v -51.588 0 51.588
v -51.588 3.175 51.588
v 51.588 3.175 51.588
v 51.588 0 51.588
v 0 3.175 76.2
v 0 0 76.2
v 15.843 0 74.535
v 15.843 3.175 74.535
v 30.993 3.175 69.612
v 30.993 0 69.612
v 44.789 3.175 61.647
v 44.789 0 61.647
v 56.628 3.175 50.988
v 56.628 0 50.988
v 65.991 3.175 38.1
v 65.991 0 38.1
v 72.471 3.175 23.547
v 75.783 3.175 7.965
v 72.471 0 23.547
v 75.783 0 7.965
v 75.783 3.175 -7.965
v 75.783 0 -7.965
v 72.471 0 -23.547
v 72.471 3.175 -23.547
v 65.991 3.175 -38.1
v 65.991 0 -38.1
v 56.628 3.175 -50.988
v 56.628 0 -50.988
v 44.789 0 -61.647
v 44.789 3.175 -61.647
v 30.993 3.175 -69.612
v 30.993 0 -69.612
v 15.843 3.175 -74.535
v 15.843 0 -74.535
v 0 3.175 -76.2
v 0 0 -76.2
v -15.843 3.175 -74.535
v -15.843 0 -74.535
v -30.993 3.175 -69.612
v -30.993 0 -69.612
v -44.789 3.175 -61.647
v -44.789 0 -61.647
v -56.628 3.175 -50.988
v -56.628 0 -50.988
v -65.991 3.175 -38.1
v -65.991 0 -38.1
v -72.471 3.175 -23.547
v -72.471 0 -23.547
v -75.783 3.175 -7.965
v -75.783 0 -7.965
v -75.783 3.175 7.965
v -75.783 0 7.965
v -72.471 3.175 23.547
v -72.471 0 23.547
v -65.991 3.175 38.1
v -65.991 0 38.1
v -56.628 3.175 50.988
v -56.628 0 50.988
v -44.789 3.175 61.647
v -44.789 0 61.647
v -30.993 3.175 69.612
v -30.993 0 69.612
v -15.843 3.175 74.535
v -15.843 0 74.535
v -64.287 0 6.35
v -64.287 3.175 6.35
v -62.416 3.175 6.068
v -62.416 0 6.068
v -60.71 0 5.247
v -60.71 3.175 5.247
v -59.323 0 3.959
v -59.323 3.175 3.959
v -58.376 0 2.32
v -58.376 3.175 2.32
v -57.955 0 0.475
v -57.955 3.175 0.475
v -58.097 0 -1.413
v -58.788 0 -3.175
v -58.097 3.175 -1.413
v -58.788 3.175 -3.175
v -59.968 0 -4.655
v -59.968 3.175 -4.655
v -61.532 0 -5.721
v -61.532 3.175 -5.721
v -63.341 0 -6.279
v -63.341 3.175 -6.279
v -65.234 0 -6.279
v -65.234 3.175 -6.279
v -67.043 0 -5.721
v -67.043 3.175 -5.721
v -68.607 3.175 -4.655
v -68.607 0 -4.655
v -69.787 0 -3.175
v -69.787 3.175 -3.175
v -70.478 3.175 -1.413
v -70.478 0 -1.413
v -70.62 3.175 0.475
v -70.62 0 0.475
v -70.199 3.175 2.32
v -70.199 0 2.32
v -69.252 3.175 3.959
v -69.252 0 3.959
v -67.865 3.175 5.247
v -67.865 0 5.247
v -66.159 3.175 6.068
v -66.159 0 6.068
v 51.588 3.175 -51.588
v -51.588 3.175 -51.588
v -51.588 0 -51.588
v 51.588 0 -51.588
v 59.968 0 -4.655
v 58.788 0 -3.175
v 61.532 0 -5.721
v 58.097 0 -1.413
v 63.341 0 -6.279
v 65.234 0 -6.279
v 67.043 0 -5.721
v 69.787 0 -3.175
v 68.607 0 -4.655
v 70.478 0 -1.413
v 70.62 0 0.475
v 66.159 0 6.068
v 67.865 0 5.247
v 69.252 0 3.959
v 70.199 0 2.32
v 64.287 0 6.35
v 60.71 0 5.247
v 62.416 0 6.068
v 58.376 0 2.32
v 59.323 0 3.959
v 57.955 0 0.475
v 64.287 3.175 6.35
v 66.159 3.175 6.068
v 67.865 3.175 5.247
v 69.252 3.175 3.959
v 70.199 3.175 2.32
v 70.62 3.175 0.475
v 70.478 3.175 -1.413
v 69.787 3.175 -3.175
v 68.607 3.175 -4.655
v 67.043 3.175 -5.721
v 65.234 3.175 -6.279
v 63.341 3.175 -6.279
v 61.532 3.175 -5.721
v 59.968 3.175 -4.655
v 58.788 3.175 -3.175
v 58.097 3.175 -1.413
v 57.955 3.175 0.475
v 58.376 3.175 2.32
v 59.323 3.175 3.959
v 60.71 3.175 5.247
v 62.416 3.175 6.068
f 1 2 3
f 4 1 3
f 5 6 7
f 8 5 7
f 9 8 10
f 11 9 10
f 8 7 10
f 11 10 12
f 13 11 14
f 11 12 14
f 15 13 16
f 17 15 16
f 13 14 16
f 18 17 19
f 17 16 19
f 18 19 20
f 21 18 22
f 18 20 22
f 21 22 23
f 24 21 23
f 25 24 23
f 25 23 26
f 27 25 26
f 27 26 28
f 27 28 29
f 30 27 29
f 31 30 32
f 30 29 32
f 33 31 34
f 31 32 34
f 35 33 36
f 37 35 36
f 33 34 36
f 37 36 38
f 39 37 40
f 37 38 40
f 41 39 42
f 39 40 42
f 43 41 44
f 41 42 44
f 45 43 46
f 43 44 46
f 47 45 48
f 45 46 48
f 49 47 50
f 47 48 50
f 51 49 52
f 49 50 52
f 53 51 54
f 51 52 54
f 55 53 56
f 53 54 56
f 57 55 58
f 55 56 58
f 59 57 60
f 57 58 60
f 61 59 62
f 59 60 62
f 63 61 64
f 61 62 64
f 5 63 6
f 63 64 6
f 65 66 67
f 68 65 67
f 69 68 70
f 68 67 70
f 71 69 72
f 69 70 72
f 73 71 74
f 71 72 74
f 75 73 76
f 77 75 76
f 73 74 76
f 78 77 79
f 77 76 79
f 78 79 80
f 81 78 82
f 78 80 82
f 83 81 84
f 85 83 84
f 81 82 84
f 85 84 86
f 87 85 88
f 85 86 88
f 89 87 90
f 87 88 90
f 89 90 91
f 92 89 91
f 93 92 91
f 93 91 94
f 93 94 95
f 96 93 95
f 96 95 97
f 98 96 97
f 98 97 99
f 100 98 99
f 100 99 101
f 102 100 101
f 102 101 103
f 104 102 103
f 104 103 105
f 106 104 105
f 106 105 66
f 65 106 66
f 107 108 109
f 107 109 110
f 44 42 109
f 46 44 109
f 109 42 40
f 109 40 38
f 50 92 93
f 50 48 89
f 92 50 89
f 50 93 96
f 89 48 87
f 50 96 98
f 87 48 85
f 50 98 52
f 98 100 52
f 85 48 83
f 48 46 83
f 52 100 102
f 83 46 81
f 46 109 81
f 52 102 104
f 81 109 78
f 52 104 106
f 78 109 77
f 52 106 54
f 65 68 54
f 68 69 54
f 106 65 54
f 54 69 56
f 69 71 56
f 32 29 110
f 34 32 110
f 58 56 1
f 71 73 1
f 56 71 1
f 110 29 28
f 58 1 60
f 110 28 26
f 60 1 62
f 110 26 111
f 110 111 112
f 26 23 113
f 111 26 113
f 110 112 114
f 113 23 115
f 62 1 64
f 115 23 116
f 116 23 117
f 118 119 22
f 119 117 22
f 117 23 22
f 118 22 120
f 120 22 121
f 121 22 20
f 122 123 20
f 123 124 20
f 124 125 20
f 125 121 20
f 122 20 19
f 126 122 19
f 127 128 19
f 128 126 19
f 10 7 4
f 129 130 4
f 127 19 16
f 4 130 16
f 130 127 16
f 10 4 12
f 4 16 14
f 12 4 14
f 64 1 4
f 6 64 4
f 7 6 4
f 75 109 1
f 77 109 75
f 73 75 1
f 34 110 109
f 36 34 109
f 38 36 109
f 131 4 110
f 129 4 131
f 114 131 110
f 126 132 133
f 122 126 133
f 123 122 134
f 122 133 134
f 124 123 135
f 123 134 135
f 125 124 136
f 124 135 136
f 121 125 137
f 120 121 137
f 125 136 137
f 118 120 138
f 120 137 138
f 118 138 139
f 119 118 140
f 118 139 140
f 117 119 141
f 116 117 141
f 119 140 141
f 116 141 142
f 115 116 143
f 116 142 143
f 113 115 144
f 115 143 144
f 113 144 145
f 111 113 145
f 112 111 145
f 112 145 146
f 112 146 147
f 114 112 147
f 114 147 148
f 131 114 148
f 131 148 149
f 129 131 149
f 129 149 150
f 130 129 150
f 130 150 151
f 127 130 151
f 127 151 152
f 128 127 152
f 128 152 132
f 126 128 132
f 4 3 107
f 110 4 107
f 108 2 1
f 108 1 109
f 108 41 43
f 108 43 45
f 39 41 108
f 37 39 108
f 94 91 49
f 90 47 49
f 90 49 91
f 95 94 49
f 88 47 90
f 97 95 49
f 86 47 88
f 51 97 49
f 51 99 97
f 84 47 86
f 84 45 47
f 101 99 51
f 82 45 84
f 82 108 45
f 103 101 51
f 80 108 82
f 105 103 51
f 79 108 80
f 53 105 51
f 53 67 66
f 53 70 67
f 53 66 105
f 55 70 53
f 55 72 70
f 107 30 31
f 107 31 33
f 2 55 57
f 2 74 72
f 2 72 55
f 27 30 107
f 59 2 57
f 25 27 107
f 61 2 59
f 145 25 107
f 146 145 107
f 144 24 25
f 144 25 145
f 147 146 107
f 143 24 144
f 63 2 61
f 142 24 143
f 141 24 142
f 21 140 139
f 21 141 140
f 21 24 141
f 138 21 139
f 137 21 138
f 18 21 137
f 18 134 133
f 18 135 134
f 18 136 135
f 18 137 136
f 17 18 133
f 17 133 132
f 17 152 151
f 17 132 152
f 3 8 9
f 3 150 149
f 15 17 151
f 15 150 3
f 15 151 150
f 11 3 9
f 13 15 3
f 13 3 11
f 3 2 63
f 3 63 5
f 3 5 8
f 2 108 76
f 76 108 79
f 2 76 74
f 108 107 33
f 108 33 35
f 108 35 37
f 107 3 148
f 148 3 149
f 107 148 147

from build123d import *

# Parameters (mm, degrees)
SKETCH1_R           = 76.2
BOSS_EXTRUDE1_DEPTH = 3.175
SKETCH2_R           = 35
CUT_EXTRUDE1_DEPTH  = 3.175
SKETCH3_R           = 6.35
CUT_EXTRUDE2_DEPTH  = 10
SKETCH5_W           = 100
SKETCH5_H           = 100
CUT_EXTRUDE3_DEPTH  = 10
FILLET1_R           = 0.5
SKETCH6_W           = 103.175
SKETCH6_H           = 103.175
CUT_EXTRUDE4_DEPTH  = 10


with BuildPart() as part:
    # Sketch1 → Boss-Extrude1 (new body)
    with BuildSketch(Plane(origin=(0, 0, 0), x_dir=(1, 0, 0), z_dir=(0, 1, 0))):
        with Locations(Location((0, 0, 0), (0, 0, 270))):
            Circle(SKETCH1_R)
    extrude(amount=BOSS_EXTRUDE1_DEPTH)

    # Sketch2 → Cut-Extrude1 (cut)
    with BuildSketch(Plane(origin=(0, 3.175, 0), x_dir=(1, 0, 0), z_dir=(0, 1, 0))):
        with Locations(Location((0, 0, 0), (0, 0, 270))):
            Circle(SKETCH2_R)
    extrude(amount=-CUT_EXTRUDE1_DEPTH, mode=Mode.SUBTRACT)

    # Sketch3 → Cut-Extrude2 (cut)
    with BuildSketch(Plane(origin=(0, 3.175, 0), x_dir=(1, 0, 0), z_dir=(0, 1, 0))):
        with Locations(Location((-64.2875, 0, 0), (0, 0, 270))):
            Circle(SKETCH3_R)
        with Locations(Location((64.2875, 0, 0), (0, 0, 270))):
            Circle(SKETCH3_R)
    extrude(amount=-CUT_EXTRUDE2_DEPTH, mode=Mode.SUBTRACT)

    # Sketch5 → Cut-Extrude3 (cut)
    with BuildSketch(Plane(origin=(0, 3.175, 0), x_dir=(1, 0, 0), z_dir=(0, 1, 0))):
        Rectangle(SKETCH5_W, SKETCH5_H)
    extrude(amount=-CUT_EXTRUDE3_DEPTH, mode=Mode.SUBTRACT)

    # Fillet1
    fillet1_edges = [part.edges().sort_by_distance(p)[0] for p in [
        (-50, 1.5875, 50),
        (-50, 1.5875, -50),
        (50, 1.5875, -50),
        (50, 1.5875, 50),
    ]]
    fillet(fillet1_edges, radius=FILLET1_R)

    # Sketch6 → Cut-Extrude4 (cut)
    with BuildSketch(Plane(origin=(0, 3.175, 0), x_dir=(1, 0, 0), z_dir=(0, 1, 0))):
        Rectangle(SKETCH6_W, SKETCH6_H)
    extrude(amount=-CUT_EXTRUDE4_DEPTH, mode=Mode.SUBTRACT)


solid = part.part
